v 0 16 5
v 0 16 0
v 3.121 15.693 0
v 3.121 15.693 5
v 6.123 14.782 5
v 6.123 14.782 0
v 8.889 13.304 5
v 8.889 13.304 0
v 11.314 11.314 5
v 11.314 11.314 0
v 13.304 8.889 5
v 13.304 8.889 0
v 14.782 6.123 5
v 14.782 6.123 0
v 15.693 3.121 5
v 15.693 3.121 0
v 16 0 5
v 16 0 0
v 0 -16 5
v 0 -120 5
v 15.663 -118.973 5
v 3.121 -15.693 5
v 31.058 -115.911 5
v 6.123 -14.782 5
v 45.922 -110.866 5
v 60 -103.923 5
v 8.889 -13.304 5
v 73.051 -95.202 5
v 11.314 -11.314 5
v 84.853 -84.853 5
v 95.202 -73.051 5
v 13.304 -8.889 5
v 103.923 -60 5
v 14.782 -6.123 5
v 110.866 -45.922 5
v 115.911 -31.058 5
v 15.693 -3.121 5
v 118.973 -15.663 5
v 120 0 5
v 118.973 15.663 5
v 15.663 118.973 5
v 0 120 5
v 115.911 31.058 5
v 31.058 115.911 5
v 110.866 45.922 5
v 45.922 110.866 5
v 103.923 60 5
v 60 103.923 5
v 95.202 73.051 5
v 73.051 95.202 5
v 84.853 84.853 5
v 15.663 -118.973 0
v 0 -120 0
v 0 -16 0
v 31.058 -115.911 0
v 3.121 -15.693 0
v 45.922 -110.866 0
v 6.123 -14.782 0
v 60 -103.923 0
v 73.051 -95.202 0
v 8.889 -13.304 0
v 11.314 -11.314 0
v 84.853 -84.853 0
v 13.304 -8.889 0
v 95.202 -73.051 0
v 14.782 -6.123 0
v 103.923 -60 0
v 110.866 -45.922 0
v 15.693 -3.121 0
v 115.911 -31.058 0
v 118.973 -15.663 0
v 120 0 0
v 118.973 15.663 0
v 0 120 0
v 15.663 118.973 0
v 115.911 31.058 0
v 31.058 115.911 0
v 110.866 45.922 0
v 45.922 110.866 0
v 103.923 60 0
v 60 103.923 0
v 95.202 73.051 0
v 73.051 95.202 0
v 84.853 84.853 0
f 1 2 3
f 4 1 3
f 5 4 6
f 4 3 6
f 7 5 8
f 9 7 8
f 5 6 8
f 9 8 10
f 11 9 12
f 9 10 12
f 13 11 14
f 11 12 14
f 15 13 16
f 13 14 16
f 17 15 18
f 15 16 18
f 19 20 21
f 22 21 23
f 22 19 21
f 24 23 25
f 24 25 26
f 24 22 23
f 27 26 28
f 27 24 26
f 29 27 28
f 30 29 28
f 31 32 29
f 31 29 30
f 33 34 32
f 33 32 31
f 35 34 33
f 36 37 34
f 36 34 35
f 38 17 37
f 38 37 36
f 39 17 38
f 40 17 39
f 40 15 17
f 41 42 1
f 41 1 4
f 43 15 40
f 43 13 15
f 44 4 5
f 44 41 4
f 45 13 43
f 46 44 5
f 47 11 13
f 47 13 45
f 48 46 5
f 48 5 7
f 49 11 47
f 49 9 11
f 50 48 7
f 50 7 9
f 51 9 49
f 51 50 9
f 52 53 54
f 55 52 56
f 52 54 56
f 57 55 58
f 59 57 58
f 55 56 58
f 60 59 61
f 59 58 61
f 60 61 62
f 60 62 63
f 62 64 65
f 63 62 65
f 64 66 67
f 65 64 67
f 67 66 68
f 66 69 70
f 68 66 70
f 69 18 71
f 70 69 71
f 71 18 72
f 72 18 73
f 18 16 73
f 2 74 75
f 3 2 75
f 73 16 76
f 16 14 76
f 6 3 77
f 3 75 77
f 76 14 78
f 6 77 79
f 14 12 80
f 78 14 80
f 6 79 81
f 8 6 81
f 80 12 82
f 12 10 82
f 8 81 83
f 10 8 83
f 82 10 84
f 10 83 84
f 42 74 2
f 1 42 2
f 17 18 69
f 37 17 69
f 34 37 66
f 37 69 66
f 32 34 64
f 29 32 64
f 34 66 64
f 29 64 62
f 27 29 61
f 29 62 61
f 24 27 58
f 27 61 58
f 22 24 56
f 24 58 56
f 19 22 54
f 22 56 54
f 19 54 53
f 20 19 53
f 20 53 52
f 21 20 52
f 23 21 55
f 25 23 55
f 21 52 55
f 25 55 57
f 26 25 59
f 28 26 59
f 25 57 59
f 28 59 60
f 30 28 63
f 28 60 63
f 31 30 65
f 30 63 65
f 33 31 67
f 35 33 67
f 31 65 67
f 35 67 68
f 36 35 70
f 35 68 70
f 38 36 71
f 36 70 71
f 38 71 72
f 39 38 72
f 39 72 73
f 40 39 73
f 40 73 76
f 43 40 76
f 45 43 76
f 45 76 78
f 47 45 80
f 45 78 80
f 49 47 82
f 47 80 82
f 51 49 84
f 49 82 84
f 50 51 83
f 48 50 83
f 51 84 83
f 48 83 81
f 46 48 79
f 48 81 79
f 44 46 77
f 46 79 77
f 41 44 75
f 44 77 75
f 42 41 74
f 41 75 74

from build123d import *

# Parameters (mm, degrees)
F1_DEPTH = 5


# Not quite as in the source:
# - a feature names something its author has since deleted; it is built from what else it names


with BuildPart() as f1:
    # F0 (on Top) → F1 (new body)
    with BuildSketch(Plane.XY):
        with BuildLine():
            Line((0, -16), (0, -120))
            ThreePointArc((0, -120), (120, 0), (0, 120))
            Line((0, 120), (0, 16))
            ThreePointArc((0, 16), (11.313708499, 11.313708499), (16, 0))
            ThreePointArc((16, 0), (11.313708499, -11.313708499), (0, -16))
        make_face()
    extrude(amount=F1_DEPTH)


solid = f1.part
